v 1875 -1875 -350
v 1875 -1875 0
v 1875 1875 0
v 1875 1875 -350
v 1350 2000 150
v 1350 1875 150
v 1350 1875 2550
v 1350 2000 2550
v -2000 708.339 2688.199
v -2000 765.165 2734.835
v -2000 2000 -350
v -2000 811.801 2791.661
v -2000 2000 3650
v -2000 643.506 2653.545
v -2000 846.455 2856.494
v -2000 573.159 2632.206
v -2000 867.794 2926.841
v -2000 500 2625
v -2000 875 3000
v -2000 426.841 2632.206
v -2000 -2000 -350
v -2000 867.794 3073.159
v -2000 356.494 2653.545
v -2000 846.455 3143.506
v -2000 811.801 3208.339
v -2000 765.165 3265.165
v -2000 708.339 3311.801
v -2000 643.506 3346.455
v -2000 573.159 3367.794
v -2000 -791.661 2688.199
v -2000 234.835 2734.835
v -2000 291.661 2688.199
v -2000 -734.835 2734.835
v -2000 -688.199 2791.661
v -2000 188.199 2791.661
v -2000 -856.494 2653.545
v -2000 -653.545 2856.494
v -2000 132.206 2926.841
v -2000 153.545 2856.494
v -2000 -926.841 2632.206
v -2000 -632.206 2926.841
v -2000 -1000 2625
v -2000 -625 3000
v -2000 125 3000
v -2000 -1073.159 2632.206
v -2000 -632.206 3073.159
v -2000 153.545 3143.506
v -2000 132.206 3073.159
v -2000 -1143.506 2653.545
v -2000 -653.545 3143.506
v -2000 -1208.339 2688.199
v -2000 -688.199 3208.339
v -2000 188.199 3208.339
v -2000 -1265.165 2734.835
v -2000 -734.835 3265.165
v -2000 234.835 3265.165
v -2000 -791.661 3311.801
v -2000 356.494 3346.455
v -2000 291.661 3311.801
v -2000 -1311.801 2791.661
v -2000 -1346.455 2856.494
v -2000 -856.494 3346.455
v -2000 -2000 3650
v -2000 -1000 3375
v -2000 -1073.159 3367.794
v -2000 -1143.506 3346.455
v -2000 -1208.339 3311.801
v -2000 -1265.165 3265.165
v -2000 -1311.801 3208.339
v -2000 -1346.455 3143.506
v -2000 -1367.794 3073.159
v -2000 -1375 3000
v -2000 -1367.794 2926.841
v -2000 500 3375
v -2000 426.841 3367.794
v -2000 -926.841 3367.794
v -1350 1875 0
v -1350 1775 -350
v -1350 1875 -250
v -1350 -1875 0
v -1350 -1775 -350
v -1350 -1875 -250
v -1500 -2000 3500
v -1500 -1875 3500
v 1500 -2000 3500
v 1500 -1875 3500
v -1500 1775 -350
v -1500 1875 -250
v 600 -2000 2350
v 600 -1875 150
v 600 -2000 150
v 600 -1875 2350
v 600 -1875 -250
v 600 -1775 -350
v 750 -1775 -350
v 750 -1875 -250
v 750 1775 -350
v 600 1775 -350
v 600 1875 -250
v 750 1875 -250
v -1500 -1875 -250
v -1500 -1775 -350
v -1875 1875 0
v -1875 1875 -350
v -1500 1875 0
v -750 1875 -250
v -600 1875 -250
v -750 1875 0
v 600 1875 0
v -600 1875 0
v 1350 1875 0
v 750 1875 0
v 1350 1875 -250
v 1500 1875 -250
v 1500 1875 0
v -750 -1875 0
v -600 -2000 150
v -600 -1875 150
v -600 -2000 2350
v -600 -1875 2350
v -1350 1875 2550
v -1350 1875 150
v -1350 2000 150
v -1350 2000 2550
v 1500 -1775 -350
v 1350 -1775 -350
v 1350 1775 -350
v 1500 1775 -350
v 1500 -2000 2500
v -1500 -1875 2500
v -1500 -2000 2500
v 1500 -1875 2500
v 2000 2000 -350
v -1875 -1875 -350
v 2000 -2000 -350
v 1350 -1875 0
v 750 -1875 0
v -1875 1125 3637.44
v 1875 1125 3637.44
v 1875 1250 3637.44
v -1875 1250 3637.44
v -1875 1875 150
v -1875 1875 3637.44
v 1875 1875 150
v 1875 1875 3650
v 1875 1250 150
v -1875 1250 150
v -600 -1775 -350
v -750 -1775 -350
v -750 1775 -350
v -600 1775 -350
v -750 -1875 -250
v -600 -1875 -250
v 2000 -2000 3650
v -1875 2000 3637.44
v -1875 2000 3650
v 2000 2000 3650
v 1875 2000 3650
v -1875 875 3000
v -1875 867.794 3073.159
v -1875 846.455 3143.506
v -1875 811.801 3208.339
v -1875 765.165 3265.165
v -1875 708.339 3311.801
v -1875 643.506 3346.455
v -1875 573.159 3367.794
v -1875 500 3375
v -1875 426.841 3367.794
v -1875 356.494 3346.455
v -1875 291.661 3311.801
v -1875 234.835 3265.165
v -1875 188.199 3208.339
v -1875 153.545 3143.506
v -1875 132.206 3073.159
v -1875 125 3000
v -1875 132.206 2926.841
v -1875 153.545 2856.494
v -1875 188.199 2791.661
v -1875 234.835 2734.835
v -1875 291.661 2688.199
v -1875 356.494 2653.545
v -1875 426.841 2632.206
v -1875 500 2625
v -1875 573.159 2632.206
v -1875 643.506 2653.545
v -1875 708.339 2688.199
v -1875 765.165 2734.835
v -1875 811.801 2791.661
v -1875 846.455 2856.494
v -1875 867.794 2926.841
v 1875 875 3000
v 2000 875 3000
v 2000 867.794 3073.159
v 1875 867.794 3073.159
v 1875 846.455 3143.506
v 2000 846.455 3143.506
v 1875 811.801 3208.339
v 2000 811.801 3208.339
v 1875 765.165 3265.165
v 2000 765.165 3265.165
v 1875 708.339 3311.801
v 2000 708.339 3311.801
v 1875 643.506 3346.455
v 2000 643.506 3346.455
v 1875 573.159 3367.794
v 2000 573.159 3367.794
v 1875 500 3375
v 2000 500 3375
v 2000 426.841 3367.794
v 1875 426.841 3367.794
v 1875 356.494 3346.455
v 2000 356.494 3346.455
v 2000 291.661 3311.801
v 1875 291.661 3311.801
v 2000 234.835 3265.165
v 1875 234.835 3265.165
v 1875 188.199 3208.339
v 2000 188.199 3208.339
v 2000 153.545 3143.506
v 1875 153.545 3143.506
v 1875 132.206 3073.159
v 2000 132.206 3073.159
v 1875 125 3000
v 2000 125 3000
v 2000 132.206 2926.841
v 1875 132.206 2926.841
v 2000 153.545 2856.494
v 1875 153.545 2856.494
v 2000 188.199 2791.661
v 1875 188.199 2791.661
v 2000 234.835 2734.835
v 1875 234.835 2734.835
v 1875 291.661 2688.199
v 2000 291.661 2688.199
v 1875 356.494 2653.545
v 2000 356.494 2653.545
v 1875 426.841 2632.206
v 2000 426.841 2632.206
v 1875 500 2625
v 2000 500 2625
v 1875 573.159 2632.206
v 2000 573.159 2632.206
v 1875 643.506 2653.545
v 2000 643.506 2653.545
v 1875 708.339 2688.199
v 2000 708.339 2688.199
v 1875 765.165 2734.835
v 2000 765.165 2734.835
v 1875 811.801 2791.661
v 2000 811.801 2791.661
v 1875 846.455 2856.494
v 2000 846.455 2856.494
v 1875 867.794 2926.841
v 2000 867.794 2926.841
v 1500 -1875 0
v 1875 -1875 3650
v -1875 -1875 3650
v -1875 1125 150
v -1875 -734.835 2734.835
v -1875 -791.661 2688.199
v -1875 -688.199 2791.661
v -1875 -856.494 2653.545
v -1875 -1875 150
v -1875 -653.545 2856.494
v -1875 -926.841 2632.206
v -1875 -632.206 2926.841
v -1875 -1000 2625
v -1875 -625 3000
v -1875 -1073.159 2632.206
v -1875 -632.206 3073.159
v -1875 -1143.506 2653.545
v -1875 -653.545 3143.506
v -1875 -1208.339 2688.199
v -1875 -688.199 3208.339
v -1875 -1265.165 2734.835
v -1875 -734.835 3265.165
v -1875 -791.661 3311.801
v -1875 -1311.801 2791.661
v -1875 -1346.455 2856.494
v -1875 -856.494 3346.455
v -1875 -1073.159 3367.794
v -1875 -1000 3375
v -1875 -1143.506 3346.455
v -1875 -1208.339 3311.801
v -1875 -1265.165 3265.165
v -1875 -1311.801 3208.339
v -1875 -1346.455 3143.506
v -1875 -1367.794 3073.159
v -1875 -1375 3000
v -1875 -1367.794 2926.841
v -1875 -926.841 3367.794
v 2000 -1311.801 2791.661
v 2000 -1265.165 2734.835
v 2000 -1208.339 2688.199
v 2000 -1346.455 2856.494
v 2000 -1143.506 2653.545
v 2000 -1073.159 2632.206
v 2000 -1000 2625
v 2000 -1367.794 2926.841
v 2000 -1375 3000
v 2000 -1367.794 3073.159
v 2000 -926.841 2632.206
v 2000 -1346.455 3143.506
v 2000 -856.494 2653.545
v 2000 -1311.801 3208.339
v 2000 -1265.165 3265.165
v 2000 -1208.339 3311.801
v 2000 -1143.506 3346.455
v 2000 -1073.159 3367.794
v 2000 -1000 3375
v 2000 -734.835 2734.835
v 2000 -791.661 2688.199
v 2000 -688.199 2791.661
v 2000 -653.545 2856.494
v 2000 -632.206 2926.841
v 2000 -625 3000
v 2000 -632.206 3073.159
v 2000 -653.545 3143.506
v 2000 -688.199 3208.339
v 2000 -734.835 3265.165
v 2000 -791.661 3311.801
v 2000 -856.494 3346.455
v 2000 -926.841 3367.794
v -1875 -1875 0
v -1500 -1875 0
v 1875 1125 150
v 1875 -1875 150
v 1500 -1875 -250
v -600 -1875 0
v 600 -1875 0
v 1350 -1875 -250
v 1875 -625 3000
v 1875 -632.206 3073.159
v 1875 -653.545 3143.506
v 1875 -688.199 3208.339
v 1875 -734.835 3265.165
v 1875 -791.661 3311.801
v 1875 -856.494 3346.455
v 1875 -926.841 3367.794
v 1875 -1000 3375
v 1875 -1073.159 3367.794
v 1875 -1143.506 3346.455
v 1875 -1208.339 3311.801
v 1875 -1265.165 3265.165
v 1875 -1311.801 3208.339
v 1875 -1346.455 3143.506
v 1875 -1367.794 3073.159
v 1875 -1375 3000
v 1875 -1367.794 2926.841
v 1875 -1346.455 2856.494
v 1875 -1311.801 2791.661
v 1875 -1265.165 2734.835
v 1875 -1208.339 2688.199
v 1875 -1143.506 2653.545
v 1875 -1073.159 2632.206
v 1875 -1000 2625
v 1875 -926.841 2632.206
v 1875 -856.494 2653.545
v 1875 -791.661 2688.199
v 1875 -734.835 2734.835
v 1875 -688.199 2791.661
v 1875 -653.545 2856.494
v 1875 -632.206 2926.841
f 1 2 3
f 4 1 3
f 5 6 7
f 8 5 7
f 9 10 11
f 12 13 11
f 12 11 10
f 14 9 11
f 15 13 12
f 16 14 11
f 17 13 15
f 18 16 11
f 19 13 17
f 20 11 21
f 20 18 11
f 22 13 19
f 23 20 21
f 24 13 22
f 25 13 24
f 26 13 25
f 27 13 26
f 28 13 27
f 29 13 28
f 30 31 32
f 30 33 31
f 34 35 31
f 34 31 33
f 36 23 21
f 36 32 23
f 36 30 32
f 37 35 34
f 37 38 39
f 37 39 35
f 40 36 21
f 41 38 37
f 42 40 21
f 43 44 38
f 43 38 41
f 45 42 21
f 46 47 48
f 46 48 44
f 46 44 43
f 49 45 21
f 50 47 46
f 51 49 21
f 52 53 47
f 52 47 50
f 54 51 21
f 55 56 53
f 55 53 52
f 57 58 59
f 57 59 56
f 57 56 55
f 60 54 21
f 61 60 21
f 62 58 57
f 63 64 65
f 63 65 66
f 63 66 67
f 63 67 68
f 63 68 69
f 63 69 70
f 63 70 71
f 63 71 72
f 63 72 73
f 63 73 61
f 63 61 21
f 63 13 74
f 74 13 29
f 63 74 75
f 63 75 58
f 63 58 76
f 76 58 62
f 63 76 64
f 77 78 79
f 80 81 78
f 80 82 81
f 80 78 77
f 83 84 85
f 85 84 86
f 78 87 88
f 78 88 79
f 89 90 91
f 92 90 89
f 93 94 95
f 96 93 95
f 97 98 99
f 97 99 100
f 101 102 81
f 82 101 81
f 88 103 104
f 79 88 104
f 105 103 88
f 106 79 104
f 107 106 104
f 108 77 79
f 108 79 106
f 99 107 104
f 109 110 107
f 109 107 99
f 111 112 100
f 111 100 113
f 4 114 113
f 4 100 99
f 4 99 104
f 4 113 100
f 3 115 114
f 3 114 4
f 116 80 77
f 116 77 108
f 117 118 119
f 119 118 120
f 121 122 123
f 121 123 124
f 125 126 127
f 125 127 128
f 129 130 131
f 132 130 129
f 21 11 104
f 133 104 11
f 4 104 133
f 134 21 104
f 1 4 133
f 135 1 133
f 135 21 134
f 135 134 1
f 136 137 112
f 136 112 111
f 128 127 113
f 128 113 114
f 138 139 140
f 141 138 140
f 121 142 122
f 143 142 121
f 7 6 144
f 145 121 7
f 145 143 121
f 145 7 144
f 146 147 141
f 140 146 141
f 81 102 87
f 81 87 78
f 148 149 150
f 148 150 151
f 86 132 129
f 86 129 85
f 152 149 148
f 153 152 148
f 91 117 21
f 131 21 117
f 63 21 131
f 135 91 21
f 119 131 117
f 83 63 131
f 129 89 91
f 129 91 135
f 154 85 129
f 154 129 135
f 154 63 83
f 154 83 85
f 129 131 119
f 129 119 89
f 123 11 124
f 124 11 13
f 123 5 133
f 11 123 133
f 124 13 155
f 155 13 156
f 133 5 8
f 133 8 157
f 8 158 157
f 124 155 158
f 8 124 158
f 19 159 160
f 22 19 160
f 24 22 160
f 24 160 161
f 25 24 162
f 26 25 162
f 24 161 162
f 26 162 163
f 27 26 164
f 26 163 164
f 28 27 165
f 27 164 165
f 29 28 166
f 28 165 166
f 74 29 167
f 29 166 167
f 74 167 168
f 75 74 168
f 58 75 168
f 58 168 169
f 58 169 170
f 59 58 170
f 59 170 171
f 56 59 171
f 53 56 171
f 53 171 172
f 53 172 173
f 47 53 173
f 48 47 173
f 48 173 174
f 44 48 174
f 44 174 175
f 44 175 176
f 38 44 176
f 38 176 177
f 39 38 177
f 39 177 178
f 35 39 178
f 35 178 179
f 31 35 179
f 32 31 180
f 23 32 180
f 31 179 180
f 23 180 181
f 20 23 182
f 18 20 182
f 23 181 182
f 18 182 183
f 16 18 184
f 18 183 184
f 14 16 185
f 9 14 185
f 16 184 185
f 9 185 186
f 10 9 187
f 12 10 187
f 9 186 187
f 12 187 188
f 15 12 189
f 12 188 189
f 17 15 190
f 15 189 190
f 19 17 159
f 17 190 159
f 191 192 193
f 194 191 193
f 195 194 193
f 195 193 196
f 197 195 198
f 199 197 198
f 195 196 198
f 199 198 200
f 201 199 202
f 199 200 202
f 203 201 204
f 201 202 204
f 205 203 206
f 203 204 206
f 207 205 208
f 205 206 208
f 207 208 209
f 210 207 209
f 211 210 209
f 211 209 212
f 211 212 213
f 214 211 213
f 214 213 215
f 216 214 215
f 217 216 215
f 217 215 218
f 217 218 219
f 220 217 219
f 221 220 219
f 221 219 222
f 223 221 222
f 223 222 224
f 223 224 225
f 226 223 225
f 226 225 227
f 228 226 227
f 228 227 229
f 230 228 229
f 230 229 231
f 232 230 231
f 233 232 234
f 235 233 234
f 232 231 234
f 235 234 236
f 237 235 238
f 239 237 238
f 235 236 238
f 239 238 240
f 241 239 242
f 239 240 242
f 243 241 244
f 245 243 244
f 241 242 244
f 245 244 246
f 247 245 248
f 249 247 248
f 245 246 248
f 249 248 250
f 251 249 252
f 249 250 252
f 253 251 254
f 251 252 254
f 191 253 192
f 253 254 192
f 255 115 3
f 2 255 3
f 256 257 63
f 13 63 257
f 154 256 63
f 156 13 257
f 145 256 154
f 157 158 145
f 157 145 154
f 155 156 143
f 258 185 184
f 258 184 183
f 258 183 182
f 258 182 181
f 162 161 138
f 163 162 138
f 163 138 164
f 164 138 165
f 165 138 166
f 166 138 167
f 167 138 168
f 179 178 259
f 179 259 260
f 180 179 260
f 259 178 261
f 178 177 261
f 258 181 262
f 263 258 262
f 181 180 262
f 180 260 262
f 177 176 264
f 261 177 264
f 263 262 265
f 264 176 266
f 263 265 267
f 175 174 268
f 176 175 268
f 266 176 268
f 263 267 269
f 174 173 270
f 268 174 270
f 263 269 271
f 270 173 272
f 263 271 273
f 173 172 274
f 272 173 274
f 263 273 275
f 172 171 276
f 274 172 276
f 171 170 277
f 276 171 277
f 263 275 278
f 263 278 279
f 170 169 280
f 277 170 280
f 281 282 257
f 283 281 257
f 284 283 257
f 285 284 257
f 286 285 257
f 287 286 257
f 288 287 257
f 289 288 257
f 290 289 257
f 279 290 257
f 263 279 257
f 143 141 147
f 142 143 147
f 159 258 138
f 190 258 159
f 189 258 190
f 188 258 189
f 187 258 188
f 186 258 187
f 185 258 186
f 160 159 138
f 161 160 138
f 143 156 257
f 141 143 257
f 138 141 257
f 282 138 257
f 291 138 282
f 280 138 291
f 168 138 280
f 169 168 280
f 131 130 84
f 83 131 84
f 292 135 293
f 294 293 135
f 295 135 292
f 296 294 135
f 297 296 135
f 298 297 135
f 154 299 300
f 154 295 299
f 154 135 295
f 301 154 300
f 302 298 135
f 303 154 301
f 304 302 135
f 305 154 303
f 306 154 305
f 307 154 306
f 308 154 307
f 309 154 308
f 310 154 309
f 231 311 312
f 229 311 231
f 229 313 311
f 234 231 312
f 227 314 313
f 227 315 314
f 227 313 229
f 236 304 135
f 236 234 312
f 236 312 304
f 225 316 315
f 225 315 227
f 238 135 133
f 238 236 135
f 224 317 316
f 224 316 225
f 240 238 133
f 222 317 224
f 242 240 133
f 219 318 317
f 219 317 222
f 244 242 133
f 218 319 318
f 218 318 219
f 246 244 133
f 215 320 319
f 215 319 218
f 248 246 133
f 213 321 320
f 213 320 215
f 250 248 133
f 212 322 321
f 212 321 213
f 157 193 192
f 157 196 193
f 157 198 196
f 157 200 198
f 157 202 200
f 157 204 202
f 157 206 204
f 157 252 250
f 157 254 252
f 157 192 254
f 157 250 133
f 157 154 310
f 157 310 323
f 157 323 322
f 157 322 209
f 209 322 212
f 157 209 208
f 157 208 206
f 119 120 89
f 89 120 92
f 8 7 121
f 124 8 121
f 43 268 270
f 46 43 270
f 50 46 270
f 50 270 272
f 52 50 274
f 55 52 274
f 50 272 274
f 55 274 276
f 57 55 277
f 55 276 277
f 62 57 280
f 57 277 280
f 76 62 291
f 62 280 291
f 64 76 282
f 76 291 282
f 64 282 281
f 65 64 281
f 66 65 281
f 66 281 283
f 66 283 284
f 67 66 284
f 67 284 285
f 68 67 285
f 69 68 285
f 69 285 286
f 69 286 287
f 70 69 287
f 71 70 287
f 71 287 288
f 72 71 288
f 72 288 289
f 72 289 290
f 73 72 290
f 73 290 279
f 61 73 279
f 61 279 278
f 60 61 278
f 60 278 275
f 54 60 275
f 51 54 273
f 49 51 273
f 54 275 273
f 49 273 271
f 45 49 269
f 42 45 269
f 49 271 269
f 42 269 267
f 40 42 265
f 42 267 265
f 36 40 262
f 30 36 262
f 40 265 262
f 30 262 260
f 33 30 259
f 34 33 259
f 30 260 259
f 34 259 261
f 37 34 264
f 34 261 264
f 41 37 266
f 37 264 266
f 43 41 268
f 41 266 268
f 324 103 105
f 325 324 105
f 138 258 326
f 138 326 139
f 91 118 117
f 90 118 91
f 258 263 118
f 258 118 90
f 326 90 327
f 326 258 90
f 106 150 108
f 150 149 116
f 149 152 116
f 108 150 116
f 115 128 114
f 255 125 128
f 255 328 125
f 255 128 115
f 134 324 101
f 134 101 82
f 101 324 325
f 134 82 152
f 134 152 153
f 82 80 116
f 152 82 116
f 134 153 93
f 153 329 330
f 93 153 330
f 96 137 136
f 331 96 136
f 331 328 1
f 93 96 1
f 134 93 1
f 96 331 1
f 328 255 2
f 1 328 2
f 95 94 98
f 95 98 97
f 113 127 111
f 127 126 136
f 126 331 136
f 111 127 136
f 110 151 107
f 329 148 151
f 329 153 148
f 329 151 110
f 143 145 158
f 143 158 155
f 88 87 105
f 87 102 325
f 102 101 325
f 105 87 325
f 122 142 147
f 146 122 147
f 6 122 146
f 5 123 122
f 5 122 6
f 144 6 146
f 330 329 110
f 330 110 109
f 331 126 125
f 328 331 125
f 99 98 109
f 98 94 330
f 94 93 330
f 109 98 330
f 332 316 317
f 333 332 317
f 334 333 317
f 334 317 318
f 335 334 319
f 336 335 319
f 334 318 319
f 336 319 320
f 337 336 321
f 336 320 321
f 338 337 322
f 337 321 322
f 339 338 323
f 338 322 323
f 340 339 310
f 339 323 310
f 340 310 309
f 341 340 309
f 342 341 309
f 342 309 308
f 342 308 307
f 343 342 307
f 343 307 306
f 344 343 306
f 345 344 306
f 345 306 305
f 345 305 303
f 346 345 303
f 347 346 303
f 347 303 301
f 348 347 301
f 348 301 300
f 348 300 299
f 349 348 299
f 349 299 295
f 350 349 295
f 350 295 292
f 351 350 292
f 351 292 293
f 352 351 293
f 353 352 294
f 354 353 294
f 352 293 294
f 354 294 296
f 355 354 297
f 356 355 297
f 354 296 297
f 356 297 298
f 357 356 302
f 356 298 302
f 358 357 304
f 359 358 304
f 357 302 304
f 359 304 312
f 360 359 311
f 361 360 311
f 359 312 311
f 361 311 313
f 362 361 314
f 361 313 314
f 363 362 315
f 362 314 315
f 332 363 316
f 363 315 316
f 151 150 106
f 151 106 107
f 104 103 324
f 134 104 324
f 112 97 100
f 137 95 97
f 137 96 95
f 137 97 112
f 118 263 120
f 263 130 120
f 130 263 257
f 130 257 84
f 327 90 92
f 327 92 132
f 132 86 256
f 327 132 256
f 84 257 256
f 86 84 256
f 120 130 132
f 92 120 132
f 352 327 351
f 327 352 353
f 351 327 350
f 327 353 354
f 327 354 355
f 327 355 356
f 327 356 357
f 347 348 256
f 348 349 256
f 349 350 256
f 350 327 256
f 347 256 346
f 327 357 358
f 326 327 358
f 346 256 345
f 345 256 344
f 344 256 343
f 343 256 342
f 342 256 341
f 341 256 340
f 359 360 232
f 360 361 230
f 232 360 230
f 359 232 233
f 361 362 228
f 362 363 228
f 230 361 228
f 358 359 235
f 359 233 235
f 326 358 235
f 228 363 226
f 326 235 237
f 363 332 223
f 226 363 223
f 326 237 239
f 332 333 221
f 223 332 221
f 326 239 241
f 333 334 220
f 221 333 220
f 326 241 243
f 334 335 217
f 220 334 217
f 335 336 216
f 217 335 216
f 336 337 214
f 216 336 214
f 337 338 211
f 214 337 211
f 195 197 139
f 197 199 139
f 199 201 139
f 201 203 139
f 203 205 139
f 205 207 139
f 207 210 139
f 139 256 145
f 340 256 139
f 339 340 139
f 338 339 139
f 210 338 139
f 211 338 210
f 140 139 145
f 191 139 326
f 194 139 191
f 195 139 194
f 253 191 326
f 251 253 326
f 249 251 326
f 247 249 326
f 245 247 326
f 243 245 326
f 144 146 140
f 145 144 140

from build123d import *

# Parameters (mm, degrees)
SKETCH_W        = 3750
SKETCH_H        = 3750
PAD_DEPTH       = 150
SKETCH001_W     = 150
SKETCH001_H     = 350
PAD001_DEPTH    = 3750
CHAMFER_SIZE    = 100
SKETCH002_W     = 4000
SKETCH002_H     = 4000
PAD002_DEPTH    = 125
SKETCH003_W     = 125
SKETCH003_H     = 3487.44
PAD003_DEPTH    = 3750
SKETCH004_W     = 4000
SKETCH004_H     = 4000
PAD004_DEPTH    = 125
SKETCH005_W     = 3750
SKETCH005_H     = 4000
SKETCH005_W_2   = 1200
SKETCH005_H_2   = 2200
SKETCH005_W_3   = 3000
SKETCH005_H_3   = 1000
PAD005_DEPTH    = 125
SKETCH006_W     = 2700
SKETCH006_H     = 2400
PAD006_DEPTH    = 125
SKETCH008_W     = 297.762541
SKETCH008_H     = 158.48645
POCKET_DEPTH    = 5
SKETCH009_R     = 375
POCKET001_DEPTH = 4000.001


with BuildPart() as part:
    # Sketch → Pad (new body)
    with BuildSketch(Plane.XY):
        Rectangle(SKETCH_W, SKETCH_H)
    extrude(amount=PAD_DEPTH)

    # Sketch001 (on Face3 of Pad) → Pad001 (join)
    with BuildSketch(Plane.XZ.offset(1875)):
        with Locations((-1425, -175)):
            Rectangle(SKETCH001_W, SKETCH001_H)
        with Locations((-675, -175)):
            Rectangle(SKETCH001_W, SKETCH001_H)
        with Locations((675, -175)):
            Rectangle(SKETCH001_W, SKETCH001_H)
        with Locations((1425, -175)):
            Rectangle(SKETCH001_W, SKETCH001_H)
    extrude(amount=-PAD001_DEPTH)

    # Chamfer
    chamfer_edges = [part.edges().sort_by_distance(p)[0] for p in [
        (-1425, -1875, -350),
        (-675, -1875, -350),
        (675, -1875, -350),
        (1425, -1875, -350),
        (1425, 1875, -350),
        (675, 1875, -350),
        (-675, 1875, -350),
        (-1425, 1875, -350),
    ]]
    chamfer(chamfer_edges, length=CHAMFER_SIZE)

    # Sketch002 (on Face10 of Chamfer) → Pad002 (join)
    with BuildSketch(Plane(origin=(-1875, 0, 0), x_dir=(0, -1, 0), z_dir=(-1, 0, 0))):
        with Locations((0, 1650)):
            Rectangle(SKETCH002_W, SKETCH002_H)
    extrude(amount=PAD002_DEPTH)

    # Sketch003 (on Face12 of Pad002) → Pad003 (join)
    with BuildSketch(Plane.YZ.offset(1875)):
        with Locations((1187.5, 1893.72)):
            Rectangle(SKETCH003_W, SKETCH003_H)
    extrude(amount=-PAD003_DEPTH)

    # Sketch004 (on Face15 of Pad003) → Pad004 (join)
    with BuildSketch(Plane.YZ.offset(1875)):
        with Locations((0, 1650)):
            Rectangle(SKETCH004_W, SKETCH004_H)
    extrude(amount=PAD004_DEPTH)

    # Sketch005 (on Face7 of Pad004) → Pad005 (join)
    with BuildSketch(Plane.XZ.offset(1875)):
        with Locations((0, 1650)):
            Rectangle(SKETCH005_W, SKETCH005_H)
        with Locations((0, 1250)):
            Rectangle(SKETCH005_W_2, SKETCH005_H_2, mode=Mode.SUBTRACT)
        with Locations((0, 3000)):
            Rectangle(SKETCH005_W_3, SKETCH005_H_3, mode=Mode.SUBTRACT)
    extrude(amount=PAD005_DEPTH)

    # Sketch006 (on Face16 of Pad005) → Pad006 (join)
    with BuildSketch(Plane(origin=(0, 1875, 0), x_dir=(-1, 0, 0), z_dir=(0, 1, 0))):
        Polygon((-1875, 3650), (1875, 3637.44), (1875, -350), (-1875, -350), align=None)
        with Locations((0, 1350)):
            Rectangle(SKETCH006_W, SKETCH006_H, mode=Mode.SUBTRACT)
    extrude(amount=PAD006_DEPTH)

    # Sketch008 → Pocket (cut)
    with BuildSketch(Plane(origin=(0, 1850, 0), x_dir=(-1, 0, 0), z_dir=(0, 1, 0))):
        with Locations((534.822146, 1582.312195)):
            Rectangle(SKETCH008_W, SKETCH008_H)
    extrude(amount=-POCKET_DEPTH, mode=Mode.SUBTRACT)

    # Sketch009 (on Face7 of Pad006) → Pocket001 (cut, through all)
    with BuildSketch(Plane.YZ.offset(2000)):
        with Locations((-1000, 3000)):
            Circle(SKETCH009_R)
        with Locations((500, 3000)):
            Circle(SKETCH009_R)
    extrude(amount=-POCKET001_DEPTH, mode=Mode.SUBTRACT)


solid = part.part
